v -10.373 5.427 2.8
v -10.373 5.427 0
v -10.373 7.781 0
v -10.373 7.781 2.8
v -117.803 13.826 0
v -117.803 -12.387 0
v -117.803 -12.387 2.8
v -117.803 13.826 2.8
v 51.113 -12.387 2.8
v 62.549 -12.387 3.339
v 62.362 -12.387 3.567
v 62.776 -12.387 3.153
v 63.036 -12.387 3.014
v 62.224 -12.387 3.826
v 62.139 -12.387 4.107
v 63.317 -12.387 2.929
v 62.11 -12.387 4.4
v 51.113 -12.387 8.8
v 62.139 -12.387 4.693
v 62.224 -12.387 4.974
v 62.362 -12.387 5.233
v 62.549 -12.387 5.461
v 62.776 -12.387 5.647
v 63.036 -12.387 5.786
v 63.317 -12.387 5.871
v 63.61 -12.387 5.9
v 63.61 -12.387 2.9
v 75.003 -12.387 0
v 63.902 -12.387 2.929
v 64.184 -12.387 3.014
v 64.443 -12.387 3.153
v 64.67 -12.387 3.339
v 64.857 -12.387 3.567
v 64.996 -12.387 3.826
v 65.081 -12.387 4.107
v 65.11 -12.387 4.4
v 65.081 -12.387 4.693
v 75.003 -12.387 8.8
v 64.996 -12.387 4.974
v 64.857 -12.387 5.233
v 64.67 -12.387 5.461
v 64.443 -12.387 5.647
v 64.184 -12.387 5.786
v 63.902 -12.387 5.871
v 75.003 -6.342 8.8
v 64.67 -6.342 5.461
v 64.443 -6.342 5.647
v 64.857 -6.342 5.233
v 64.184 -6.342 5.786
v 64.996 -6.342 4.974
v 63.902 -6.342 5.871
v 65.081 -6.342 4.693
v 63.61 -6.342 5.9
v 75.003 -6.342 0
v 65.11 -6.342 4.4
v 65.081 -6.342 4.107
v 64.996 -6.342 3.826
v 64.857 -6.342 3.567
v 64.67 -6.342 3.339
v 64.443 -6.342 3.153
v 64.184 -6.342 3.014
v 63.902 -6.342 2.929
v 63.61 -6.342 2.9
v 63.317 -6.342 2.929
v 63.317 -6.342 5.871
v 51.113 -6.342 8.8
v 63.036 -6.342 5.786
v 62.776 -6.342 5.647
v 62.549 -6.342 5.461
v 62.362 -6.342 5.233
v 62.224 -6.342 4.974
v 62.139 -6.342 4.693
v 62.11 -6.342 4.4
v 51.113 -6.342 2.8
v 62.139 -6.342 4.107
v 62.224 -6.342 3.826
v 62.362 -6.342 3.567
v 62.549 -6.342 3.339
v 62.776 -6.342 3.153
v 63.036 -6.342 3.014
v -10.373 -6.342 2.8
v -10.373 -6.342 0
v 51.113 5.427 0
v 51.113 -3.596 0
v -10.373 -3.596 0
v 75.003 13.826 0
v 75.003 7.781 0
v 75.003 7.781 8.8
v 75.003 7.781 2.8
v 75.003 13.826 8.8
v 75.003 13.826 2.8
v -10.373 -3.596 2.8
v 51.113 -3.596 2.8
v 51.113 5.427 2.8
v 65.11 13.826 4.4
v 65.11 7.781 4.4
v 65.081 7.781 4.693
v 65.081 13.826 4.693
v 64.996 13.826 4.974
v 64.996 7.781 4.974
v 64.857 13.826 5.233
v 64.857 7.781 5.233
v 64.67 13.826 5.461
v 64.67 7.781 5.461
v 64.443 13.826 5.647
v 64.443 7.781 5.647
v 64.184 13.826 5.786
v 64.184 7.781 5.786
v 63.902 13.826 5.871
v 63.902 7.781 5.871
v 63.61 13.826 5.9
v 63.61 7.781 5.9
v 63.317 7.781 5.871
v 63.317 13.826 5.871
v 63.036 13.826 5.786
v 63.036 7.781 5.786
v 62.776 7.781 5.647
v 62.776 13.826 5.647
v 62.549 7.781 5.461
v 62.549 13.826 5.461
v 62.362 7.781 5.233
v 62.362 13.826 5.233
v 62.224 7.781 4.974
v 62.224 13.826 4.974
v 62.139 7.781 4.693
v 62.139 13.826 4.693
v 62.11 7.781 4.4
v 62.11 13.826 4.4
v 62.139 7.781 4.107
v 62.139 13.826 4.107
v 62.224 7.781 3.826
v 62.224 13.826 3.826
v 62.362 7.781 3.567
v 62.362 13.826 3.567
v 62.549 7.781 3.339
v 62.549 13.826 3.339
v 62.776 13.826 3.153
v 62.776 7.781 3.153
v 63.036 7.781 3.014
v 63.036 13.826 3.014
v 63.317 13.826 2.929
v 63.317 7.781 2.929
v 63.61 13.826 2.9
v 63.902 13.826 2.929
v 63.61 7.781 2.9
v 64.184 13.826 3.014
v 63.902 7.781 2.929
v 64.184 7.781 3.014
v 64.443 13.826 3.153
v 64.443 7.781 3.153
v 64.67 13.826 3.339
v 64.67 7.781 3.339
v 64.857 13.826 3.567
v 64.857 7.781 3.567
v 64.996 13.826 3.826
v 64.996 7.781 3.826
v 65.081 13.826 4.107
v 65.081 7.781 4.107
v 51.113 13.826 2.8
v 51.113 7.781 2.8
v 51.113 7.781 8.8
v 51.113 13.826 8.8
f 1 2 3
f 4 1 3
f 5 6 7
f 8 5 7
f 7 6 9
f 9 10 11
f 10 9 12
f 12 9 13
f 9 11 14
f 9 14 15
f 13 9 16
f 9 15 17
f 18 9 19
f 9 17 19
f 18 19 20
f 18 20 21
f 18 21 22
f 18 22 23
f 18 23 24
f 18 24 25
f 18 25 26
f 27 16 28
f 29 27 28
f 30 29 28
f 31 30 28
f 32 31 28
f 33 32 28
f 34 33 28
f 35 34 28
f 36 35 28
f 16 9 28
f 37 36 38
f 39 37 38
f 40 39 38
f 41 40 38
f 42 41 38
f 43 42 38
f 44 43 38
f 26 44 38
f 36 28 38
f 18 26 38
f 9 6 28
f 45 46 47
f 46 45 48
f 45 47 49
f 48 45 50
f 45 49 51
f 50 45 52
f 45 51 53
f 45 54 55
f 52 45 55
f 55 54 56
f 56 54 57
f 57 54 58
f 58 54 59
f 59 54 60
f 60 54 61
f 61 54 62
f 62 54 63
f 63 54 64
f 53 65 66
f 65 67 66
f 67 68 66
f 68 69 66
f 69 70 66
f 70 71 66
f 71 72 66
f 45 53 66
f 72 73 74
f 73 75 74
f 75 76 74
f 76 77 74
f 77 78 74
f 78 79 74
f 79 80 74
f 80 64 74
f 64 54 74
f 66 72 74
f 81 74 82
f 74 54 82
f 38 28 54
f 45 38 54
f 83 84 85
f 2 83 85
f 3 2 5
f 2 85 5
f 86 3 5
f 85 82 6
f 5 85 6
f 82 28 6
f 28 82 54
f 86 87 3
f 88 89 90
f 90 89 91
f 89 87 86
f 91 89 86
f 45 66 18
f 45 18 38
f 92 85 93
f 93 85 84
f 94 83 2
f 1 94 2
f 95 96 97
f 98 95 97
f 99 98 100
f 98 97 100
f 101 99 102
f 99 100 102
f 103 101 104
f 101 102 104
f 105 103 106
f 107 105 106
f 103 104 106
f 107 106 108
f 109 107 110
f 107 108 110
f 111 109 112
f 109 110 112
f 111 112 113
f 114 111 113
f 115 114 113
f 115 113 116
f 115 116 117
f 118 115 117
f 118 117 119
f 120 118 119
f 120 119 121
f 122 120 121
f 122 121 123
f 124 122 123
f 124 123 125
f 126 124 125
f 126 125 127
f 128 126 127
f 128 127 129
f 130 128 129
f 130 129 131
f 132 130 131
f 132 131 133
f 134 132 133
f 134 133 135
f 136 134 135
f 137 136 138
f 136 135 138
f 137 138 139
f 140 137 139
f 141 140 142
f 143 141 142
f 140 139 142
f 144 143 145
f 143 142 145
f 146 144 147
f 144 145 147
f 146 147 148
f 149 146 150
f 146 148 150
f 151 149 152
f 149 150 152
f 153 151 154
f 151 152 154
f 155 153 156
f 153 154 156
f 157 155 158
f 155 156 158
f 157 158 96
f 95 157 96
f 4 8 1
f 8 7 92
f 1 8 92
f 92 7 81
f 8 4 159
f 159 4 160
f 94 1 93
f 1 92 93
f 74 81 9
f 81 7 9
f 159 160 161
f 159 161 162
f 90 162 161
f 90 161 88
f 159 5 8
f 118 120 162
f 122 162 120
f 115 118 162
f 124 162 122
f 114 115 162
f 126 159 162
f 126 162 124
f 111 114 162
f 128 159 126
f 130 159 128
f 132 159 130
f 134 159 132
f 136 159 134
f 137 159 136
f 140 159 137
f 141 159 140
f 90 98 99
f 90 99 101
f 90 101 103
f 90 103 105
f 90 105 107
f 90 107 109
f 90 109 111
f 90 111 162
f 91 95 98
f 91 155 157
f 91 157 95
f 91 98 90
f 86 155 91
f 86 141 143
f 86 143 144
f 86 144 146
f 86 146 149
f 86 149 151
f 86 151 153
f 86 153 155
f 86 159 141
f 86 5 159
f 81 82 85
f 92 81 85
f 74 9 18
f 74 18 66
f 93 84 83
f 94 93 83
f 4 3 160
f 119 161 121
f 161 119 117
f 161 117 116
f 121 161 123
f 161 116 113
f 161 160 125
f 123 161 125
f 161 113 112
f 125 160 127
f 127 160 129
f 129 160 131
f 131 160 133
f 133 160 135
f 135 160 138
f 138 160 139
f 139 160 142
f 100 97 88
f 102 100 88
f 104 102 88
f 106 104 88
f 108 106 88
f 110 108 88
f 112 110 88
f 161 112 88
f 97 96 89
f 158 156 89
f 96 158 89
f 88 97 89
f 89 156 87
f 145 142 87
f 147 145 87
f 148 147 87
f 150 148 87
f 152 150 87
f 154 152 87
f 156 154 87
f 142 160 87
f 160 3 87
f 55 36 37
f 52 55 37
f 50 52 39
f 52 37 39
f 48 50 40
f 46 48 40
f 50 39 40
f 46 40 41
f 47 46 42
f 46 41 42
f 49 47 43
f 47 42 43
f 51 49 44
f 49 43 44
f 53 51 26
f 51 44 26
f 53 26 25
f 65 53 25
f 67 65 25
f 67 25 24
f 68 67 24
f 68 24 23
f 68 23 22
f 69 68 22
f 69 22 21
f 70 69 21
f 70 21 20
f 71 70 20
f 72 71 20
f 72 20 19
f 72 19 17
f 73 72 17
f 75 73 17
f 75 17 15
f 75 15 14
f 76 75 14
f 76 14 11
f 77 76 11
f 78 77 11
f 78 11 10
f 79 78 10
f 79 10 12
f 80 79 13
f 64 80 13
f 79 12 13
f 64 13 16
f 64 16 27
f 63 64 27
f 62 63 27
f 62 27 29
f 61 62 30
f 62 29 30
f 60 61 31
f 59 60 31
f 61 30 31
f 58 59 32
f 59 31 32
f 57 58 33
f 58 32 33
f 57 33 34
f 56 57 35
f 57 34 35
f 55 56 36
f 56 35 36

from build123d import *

# Parameters (mm, degrees)
F1_DEPTH = 2.8
F2_DEPTH = 42.8
F3_DEPTH = 1.439
F4_DEPTH = 85.376
F5_W     = 23.89
F5_H     = 6.0450145833
F5_H_2   = 6.0446187854
F6_DEPTH = 6
F7_R     = 1.5
F8_DEPTH = 27.5
F9_DEPTH = 23.89


with BuildPart() as f1:
    # F0 (on Top) → F1 (new body)
    with BuildSketch(Plane.XY):
        Polygon((-75.0034600496, -12.3867541552), (75.0034600496, -12.3867541552), (75.0034600496, -6.3421353698), (-10.3727839887, -6.3421353698), (-10.3727839887, -3.5960208625), (75.0034600496, -3.5960208625), (75.0034600496, 5.426927004), (-10.3727839887, 5.426927004), (-10.3727839887, 7.7807395719), (75.0034600496, 7.7807395719), (75.0034600496, 12.3867541552), (-75.0034600496, 12.3867541552), align=None)
    extrude(amount=F1_DEPTH)

    # F2 (add): a face of the model
    f2_faces = [f1.faces().sort_by_distance(p)[0] for p in [
        (-75.0034600496, 0, 1.4),
    ]]
    extrude(f2_faces, amount=F2_DEPTH)

    # F3 (add): a face of the model
    f3_faces = [f1.faces().sort_by_distance(p)[0] for p in [
        (-21.4, 12.3867541552, 1.4),
    ]]
    extrude(f3_faces, amount=F3_DEPTH)

    # F4 (cut): a face of the model
    f4_faces = [f1.faces().sort_by_distance(p)[0] for p in [
        (-21.4, 13.8257541552, 1.4),
    ]]
    extrude(f4_faces, amount=F4_DEPTH, mode=Mode.SUBTRACT)

    # F5 (on face) → F6 (join)
    with BuildSketch(Plane.XY.offset(2.8)):
        with Locations((63.0584600496, 10.8032468635)):
            Rectangle(F5_W, F5_H)
        with Locations((63.0584600496, -9.3644447625)):
            Rectangle(F5_W, F5_H_2)
    extrude(amount=F6_DEPTH)

    # F7 (on face) → F8 (cut)
    with BuildSketch(Plane.XZ.offset(12.3867541552)):
        with Locations((63.6097000496, 4.4)):
            Circle(F7_R)
    extrude(amount=-F8_DEPTH, mode=Mode.SUBTRACT)

    # F9 (cut): a face of the model
    f9_faces = [f1.faces().sort_by_distance(p)[0] for p in [
        (75.0034600496, 0.9154530708, 1.4),
    ]]
    extrude(f9_faces, amount=-F9_DEPTH, mode=Mode.SUBTRACT)


solid = f1.part
